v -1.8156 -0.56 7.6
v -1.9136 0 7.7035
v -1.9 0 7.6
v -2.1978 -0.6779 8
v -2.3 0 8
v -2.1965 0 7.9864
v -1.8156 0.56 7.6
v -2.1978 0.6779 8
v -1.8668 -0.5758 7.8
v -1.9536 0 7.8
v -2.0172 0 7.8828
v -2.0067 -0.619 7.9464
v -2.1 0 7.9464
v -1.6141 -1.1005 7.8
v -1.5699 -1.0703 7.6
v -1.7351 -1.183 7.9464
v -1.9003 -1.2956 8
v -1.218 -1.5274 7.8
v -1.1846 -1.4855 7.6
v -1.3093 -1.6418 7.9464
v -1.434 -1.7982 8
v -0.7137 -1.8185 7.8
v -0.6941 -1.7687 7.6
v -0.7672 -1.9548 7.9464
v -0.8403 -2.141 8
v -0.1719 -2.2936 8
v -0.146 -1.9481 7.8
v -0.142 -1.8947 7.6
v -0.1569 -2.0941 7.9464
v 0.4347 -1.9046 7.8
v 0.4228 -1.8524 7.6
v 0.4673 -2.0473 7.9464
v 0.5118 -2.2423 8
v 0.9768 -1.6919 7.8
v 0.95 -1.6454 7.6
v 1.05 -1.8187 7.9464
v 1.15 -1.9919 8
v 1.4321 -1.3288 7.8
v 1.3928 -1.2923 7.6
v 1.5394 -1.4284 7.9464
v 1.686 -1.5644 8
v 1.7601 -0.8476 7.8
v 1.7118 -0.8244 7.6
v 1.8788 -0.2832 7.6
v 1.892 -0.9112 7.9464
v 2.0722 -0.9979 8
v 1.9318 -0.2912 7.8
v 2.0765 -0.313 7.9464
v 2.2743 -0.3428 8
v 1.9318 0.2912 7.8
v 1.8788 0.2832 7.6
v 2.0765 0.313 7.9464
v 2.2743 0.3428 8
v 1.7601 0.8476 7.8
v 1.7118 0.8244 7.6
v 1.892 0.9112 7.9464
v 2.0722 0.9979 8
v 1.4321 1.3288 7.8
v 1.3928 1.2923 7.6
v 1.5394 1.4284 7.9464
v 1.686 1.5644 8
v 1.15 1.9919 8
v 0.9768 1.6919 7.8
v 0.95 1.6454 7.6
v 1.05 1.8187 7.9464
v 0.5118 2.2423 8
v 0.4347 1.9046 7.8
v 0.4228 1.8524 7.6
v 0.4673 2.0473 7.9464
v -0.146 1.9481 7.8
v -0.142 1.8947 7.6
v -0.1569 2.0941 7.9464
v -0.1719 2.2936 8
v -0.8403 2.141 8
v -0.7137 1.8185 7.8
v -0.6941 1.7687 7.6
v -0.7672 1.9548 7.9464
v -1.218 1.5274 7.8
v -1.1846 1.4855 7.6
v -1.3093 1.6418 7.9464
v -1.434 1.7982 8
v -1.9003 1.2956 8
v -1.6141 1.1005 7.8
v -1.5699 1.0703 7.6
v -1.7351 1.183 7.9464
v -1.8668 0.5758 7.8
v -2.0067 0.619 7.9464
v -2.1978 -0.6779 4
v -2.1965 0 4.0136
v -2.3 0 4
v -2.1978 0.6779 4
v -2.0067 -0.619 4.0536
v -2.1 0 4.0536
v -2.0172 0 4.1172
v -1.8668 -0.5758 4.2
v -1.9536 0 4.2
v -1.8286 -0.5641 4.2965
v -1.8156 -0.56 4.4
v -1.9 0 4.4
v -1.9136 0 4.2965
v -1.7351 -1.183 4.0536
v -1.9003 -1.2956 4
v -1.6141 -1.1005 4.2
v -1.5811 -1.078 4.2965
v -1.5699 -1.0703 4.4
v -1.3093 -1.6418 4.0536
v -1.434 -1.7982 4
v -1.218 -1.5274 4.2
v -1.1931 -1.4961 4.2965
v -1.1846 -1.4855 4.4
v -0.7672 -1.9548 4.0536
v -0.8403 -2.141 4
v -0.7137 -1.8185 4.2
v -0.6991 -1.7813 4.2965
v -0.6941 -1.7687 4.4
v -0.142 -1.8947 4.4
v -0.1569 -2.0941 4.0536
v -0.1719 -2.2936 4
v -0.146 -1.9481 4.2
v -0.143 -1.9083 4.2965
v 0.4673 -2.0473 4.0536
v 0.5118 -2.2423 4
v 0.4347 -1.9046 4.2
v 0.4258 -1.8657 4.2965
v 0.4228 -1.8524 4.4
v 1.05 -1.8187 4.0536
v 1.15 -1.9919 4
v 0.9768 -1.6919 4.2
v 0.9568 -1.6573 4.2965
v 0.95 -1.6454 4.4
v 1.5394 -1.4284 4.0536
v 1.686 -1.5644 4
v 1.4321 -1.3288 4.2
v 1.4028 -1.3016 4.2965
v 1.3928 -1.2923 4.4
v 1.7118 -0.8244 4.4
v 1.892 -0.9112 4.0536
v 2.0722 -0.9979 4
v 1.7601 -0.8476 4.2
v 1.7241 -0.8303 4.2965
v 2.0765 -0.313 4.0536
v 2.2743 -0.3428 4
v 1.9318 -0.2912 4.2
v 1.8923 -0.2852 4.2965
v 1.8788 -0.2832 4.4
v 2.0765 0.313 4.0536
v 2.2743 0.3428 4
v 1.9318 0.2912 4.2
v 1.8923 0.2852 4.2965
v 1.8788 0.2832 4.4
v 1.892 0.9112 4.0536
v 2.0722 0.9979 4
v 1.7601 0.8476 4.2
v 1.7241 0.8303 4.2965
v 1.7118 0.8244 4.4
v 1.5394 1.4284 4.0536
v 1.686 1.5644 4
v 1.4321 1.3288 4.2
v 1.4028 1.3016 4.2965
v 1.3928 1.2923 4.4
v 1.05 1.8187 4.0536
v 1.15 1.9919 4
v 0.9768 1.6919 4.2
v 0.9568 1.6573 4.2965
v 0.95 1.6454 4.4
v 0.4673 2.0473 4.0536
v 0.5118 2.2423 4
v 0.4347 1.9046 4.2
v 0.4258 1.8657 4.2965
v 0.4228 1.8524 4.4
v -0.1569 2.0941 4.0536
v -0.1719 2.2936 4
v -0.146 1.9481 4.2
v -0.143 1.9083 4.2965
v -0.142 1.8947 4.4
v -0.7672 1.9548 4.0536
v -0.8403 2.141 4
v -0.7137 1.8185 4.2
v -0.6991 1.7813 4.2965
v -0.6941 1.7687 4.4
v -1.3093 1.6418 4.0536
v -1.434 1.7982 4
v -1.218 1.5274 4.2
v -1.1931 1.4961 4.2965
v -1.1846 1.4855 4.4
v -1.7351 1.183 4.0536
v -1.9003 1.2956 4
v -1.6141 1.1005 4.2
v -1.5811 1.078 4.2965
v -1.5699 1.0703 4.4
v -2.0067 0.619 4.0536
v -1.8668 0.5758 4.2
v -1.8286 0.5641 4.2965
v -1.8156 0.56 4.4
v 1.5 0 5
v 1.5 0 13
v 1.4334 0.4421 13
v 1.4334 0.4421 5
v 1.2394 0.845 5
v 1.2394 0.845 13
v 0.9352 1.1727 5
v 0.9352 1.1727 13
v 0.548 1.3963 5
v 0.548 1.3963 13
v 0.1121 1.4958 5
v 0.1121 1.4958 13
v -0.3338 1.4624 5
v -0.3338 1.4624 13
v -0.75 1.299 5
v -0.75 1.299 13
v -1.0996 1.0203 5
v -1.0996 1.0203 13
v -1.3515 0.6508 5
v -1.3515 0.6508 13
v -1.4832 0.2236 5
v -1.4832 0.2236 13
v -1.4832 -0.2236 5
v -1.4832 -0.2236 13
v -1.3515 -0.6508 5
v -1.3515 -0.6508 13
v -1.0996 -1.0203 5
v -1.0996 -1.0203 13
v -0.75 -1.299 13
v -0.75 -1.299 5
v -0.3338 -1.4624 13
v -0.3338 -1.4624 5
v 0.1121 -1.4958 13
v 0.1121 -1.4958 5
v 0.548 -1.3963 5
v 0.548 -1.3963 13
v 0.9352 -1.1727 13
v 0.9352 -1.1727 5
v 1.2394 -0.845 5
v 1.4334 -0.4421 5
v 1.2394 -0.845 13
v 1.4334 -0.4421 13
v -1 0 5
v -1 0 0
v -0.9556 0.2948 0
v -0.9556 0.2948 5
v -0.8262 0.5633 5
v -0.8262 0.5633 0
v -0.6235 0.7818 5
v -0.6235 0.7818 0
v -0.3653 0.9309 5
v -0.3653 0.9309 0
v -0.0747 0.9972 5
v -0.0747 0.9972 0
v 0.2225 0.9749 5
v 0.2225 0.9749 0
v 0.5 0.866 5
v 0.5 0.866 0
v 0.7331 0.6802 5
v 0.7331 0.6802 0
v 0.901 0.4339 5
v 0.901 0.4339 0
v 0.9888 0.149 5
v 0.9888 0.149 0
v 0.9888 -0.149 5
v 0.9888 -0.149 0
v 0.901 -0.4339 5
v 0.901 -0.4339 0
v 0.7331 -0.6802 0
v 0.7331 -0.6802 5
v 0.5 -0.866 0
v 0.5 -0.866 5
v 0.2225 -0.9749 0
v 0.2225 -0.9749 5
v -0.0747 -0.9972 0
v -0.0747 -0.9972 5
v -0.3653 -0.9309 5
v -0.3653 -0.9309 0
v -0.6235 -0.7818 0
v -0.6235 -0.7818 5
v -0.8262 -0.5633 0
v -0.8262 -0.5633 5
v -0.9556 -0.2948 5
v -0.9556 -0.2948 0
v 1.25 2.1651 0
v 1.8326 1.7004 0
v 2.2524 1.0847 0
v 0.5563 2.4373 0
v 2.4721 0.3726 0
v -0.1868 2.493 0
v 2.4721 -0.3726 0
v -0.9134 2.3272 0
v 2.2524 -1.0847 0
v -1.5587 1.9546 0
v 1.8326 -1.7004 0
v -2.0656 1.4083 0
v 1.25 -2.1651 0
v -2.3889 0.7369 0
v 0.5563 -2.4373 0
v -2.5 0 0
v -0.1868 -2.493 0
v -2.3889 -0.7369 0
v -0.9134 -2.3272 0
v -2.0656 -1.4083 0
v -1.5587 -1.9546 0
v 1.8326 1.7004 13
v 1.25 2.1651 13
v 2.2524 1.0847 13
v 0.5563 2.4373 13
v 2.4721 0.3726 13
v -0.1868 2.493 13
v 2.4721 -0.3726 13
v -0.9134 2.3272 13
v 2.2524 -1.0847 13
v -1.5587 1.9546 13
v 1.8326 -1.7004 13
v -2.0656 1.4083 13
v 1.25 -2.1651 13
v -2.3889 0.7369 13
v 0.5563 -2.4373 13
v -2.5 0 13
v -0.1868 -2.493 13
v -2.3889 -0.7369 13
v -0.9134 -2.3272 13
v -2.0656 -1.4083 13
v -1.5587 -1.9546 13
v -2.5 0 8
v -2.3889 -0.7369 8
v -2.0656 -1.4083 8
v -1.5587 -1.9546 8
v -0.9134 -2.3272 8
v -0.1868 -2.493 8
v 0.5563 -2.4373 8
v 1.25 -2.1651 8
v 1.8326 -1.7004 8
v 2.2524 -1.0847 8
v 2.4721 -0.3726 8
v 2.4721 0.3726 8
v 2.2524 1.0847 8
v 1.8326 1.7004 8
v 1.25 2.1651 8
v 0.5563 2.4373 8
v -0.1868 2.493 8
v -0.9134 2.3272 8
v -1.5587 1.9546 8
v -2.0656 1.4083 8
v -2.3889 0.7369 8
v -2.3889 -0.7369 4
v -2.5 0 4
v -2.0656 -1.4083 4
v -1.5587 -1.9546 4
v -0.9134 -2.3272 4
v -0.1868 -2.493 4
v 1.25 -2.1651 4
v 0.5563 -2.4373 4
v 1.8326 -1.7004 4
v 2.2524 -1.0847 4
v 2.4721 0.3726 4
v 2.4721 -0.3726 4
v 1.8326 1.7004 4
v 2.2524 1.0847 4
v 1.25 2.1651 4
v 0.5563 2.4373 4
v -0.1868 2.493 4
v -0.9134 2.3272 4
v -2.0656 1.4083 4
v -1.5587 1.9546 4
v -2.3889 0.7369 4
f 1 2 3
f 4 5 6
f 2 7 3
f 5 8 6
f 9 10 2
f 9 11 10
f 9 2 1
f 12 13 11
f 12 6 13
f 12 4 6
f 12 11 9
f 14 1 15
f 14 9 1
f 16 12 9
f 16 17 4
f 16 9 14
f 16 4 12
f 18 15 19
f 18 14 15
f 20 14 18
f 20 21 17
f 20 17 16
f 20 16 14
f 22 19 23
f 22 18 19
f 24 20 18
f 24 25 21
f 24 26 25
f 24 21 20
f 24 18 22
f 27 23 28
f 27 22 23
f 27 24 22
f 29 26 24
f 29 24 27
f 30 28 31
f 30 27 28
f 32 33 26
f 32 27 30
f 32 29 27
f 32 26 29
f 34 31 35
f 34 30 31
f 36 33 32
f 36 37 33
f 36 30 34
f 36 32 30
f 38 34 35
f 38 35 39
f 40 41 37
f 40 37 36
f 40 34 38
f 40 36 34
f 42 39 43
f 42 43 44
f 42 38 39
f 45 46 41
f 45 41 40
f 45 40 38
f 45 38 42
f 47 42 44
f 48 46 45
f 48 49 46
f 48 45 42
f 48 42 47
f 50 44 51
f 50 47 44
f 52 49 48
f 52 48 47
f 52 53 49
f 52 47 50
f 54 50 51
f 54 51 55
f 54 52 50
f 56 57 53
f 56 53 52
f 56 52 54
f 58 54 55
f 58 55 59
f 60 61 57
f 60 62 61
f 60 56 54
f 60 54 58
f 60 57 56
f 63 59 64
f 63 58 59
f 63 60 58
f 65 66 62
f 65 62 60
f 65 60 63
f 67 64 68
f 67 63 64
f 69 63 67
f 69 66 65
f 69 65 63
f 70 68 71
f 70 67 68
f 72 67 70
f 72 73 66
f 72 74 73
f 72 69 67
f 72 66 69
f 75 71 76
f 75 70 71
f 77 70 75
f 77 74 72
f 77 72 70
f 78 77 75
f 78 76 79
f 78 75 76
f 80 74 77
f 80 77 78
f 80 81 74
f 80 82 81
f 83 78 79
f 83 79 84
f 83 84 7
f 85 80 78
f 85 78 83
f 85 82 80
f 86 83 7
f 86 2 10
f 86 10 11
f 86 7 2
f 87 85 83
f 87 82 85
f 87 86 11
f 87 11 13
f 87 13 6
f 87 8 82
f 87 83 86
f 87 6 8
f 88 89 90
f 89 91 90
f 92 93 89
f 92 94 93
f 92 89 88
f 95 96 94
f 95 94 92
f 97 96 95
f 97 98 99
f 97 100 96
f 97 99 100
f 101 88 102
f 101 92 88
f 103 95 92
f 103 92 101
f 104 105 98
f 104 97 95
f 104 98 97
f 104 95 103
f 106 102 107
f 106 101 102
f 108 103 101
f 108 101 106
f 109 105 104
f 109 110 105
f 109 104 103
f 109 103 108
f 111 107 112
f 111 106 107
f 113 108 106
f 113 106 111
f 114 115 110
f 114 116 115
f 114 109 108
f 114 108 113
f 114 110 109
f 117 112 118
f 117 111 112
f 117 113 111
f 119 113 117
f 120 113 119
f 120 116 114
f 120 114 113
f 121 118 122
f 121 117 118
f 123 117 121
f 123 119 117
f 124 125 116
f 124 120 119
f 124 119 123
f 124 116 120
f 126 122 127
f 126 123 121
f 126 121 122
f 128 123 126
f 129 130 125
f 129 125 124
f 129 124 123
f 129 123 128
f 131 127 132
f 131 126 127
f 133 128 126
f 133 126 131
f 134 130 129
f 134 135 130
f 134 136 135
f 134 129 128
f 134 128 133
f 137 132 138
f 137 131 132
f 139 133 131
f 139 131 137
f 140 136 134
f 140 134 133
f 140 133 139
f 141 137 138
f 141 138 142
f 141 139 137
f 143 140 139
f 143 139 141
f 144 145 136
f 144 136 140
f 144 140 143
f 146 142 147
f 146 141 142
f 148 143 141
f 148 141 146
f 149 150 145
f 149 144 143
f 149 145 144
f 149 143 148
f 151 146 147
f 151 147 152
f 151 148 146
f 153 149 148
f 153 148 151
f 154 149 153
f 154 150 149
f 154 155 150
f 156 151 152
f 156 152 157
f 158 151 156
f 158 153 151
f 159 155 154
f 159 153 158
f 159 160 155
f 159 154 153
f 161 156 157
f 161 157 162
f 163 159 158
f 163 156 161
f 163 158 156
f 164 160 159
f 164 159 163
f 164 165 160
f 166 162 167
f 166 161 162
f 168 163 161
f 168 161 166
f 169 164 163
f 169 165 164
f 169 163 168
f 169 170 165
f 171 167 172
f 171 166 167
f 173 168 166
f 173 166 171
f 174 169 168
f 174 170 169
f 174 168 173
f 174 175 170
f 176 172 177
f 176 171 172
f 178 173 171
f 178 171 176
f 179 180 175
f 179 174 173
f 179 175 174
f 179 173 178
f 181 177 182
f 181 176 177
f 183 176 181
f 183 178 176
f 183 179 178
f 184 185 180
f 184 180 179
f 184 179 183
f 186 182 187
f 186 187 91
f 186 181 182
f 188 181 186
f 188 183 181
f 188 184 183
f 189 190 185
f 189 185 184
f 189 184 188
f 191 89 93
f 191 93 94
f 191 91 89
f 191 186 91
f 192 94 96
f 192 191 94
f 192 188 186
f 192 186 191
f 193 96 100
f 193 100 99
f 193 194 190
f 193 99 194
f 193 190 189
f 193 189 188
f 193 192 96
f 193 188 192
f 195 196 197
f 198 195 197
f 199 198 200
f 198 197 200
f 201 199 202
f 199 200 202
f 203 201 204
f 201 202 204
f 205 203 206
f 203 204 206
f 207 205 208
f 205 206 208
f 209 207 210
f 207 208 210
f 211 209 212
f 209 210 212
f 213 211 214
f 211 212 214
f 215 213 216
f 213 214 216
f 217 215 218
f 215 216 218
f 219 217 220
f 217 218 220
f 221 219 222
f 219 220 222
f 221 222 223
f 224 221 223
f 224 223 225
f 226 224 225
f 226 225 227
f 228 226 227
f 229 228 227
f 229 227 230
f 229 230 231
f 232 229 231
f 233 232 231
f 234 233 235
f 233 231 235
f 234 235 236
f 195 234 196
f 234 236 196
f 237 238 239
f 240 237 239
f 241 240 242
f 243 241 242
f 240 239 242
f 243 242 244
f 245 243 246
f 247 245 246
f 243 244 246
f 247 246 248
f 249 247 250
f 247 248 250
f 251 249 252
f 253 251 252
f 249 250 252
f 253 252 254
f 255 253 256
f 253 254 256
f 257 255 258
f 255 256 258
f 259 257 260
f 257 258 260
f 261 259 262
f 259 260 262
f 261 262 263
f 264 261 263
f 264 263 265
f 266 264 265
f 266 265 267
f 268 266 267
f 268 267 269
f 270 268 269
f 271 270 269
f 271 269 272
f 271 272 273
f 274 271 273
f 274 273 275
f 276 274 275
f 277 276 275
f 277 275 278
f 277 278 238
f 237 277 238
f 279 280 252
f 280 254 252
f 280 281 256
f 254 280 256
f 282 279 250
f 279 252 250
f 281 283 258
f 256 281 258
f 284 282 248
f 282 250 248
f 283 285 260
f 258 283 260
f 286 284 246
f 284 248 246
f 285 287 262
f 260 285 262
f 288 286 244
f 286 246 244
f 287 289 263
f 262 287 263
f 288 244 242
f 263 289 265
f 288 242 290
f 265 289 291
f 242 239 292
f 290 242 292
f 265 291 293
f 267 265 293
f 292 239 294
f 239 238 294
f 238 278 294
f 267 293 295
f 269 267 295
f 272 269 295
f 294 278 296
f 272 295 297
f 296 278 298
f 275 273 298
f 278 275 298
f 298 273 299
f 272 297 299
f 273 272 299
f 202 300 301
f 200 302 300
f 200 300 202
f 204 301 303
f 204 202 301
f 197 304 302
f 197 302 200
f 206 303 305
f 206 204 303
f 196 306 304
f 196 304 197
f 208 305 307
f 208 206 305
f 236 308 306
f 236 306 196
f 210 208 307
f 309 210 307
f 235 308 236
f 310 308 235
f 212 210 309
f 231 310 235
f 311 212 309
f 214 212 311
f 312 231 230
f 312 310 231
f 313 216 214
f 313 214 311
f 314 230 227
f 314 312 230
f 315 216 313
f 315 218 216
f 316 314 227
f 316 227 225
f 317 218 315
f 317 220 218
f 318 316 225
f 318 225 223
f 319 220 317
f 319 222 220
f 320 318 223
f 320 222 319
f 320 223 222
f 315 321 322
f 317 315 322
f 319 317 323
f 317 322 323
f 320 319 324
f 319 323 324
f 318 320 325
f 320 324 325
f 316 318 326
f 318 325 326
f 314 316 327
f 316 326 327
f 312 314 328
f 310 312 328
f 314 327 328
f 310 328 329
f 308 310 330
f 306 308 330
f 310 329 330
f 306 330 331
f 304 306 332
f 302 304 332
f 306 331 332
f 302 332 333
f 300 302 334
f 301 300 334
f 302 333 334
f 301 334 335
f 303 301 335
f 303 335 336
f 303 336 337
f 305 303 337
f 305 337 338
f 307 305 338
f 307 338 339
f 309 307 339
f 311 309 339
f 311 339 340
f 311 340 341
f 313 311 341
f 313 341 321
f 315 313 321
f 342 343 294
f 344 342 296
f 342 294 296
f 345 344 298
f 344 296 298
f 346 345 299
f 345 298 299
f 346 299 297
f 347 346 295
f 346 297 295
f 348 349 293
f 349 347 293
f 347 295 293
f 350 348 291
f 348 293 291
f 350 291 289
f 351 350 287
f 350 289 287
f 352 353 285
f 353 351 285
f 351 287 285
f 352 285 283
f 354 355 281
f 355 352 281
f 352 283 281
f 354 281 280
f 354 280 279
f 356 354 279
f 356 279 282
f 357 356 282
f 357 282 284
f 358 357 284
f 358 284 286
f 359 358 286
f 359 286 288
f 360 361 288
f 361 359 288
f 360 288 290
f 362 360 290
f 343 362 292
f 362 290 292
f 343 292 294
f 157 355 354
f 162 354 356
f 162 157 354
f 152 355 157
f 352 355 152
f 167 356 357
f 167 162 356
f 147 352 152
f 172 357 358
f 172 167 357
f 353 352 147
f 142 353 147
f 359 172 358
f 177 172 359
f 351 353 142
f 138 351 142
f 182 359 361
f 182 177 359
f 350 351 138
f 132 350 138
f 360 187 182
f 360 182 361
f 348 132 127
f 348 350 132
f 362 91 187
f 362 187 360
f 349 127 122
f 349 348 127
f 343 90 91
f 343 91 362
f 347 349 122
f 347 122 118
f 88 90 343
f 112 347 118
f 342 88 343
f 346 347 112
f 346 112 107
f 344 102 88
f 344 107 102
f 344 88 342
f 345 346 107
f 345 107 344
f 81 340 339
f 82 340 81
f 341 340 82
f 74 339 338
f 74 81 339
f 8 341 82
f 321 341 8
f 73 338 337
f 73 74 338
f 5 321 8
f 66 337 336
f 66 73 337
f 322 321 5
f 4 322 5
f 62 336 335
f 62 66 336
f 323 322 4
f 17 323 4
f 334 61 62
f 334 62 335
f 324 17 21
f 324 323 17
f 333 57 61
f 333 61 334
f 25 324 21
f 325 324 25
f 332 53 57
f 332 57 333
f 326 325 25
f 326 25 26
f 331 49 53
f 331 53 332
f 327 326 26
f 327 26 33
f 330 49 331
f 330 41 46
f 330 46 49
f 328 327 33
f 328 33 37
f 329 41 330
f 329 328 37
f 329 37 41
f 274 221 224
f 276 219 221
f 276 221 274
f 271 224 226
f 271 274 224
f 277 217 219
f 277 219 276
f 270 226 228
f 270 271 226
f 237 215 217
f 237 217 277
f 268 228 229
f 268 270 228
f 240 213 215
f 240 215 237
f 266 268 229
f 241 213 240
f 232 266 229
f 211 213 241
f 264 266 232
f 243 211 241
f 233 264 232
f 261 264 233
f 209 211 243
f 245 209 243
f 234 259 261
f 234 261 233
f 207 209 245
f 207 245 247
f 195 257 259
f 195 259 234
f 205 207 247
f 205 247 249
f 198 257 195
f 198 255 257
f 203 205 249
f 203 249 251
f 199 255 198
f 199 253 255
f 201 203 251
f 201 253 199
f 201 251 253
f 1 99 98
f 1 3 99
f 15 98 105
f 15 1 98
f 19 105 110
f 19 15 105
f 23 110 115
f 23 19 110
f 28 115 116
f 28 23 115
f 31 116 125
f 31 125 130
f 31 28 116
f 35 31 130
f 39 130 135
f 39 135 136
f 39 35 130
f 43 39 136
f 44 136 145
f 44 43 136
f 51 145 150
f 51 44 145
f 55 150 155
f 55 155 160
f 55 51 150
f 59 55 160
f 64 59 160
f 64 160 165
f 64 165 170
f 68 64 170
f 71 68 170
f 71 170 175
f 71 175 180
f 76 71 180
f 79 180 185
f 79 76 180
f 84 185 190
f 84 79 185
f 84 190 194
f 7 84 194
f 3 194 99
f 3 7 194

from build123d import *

# Parameters (mm, degrees)
SKETCH1_R                = 2.5
BOSS_EXTRUDE1_DEPTH      = 13
F_2_0_2_DIAMETER_HOLE1_D = 2
SKETCH8_R                = 1.5
CUT_EXTRUDE1_DEPTH       = 8


with BuildPart() as part:
    # Sketch1 → Boss-Extrude1 (new body)
    with BuildSketch(Plane.XY):
        with Locations(Location((0, 0, 0), (0, 0, 180))):
            Circle(SKETCH1_R)
    extrude(amount=BOSS_EXTRUDE1_DEPTH)

    # Sketch3 → Cut-Revolve1 (revolve, cut)
    with BuildSketch(Plane(origin=(0, 0, 0), x_dir=(1, 0, 0), z_dir=(0, 1, 0)), mode=Mode.PRIVATE) as cut_revolve1_sk:
        with BuildLine():
            Line((3.138230266, -4), (2.3, -4))
            ThreePointArc((2.3, -4), (2.017157288, -4.117157288), (1.9, -4.4))
            Line((1.9, -4.4), (1.9, -7.6))
            ThreePointArc((1.9, -7.6), (2.017157288, -7.882842712), (2.3, -8))
            Line((2.3, -8), (3.138230266, -8))
            Line((3.138230266, -8), (3.138230266, -4))
        make_face()
    revolve(cut_revolve1_sk.sketch.rotate(Axis((0, 0, 0), (0, 0, 1)), 180), axis=Axis((0, 0, 0), (0, 0, 1)), mode=Mode.SUBTRACT)

    # Ø2.0 (2) Diameter Hole1 (through all)
    with Locations(Plane.XY.offset(13)):
        with Locations((0, 0)):
            Hole(F_2_0_2_DIAMETER_HOLE1_D / 2)

    # Sketch8 → Cut-Extrude1 (cut)
    with BuildSketch(Plane.XY.offset(13)):
        Circle(SKETCH8_R)
    extrude(amount=-CUT_EXTRUDE1_DEPTH, mode=Mode.SUBTRACT)


solid = part.part
